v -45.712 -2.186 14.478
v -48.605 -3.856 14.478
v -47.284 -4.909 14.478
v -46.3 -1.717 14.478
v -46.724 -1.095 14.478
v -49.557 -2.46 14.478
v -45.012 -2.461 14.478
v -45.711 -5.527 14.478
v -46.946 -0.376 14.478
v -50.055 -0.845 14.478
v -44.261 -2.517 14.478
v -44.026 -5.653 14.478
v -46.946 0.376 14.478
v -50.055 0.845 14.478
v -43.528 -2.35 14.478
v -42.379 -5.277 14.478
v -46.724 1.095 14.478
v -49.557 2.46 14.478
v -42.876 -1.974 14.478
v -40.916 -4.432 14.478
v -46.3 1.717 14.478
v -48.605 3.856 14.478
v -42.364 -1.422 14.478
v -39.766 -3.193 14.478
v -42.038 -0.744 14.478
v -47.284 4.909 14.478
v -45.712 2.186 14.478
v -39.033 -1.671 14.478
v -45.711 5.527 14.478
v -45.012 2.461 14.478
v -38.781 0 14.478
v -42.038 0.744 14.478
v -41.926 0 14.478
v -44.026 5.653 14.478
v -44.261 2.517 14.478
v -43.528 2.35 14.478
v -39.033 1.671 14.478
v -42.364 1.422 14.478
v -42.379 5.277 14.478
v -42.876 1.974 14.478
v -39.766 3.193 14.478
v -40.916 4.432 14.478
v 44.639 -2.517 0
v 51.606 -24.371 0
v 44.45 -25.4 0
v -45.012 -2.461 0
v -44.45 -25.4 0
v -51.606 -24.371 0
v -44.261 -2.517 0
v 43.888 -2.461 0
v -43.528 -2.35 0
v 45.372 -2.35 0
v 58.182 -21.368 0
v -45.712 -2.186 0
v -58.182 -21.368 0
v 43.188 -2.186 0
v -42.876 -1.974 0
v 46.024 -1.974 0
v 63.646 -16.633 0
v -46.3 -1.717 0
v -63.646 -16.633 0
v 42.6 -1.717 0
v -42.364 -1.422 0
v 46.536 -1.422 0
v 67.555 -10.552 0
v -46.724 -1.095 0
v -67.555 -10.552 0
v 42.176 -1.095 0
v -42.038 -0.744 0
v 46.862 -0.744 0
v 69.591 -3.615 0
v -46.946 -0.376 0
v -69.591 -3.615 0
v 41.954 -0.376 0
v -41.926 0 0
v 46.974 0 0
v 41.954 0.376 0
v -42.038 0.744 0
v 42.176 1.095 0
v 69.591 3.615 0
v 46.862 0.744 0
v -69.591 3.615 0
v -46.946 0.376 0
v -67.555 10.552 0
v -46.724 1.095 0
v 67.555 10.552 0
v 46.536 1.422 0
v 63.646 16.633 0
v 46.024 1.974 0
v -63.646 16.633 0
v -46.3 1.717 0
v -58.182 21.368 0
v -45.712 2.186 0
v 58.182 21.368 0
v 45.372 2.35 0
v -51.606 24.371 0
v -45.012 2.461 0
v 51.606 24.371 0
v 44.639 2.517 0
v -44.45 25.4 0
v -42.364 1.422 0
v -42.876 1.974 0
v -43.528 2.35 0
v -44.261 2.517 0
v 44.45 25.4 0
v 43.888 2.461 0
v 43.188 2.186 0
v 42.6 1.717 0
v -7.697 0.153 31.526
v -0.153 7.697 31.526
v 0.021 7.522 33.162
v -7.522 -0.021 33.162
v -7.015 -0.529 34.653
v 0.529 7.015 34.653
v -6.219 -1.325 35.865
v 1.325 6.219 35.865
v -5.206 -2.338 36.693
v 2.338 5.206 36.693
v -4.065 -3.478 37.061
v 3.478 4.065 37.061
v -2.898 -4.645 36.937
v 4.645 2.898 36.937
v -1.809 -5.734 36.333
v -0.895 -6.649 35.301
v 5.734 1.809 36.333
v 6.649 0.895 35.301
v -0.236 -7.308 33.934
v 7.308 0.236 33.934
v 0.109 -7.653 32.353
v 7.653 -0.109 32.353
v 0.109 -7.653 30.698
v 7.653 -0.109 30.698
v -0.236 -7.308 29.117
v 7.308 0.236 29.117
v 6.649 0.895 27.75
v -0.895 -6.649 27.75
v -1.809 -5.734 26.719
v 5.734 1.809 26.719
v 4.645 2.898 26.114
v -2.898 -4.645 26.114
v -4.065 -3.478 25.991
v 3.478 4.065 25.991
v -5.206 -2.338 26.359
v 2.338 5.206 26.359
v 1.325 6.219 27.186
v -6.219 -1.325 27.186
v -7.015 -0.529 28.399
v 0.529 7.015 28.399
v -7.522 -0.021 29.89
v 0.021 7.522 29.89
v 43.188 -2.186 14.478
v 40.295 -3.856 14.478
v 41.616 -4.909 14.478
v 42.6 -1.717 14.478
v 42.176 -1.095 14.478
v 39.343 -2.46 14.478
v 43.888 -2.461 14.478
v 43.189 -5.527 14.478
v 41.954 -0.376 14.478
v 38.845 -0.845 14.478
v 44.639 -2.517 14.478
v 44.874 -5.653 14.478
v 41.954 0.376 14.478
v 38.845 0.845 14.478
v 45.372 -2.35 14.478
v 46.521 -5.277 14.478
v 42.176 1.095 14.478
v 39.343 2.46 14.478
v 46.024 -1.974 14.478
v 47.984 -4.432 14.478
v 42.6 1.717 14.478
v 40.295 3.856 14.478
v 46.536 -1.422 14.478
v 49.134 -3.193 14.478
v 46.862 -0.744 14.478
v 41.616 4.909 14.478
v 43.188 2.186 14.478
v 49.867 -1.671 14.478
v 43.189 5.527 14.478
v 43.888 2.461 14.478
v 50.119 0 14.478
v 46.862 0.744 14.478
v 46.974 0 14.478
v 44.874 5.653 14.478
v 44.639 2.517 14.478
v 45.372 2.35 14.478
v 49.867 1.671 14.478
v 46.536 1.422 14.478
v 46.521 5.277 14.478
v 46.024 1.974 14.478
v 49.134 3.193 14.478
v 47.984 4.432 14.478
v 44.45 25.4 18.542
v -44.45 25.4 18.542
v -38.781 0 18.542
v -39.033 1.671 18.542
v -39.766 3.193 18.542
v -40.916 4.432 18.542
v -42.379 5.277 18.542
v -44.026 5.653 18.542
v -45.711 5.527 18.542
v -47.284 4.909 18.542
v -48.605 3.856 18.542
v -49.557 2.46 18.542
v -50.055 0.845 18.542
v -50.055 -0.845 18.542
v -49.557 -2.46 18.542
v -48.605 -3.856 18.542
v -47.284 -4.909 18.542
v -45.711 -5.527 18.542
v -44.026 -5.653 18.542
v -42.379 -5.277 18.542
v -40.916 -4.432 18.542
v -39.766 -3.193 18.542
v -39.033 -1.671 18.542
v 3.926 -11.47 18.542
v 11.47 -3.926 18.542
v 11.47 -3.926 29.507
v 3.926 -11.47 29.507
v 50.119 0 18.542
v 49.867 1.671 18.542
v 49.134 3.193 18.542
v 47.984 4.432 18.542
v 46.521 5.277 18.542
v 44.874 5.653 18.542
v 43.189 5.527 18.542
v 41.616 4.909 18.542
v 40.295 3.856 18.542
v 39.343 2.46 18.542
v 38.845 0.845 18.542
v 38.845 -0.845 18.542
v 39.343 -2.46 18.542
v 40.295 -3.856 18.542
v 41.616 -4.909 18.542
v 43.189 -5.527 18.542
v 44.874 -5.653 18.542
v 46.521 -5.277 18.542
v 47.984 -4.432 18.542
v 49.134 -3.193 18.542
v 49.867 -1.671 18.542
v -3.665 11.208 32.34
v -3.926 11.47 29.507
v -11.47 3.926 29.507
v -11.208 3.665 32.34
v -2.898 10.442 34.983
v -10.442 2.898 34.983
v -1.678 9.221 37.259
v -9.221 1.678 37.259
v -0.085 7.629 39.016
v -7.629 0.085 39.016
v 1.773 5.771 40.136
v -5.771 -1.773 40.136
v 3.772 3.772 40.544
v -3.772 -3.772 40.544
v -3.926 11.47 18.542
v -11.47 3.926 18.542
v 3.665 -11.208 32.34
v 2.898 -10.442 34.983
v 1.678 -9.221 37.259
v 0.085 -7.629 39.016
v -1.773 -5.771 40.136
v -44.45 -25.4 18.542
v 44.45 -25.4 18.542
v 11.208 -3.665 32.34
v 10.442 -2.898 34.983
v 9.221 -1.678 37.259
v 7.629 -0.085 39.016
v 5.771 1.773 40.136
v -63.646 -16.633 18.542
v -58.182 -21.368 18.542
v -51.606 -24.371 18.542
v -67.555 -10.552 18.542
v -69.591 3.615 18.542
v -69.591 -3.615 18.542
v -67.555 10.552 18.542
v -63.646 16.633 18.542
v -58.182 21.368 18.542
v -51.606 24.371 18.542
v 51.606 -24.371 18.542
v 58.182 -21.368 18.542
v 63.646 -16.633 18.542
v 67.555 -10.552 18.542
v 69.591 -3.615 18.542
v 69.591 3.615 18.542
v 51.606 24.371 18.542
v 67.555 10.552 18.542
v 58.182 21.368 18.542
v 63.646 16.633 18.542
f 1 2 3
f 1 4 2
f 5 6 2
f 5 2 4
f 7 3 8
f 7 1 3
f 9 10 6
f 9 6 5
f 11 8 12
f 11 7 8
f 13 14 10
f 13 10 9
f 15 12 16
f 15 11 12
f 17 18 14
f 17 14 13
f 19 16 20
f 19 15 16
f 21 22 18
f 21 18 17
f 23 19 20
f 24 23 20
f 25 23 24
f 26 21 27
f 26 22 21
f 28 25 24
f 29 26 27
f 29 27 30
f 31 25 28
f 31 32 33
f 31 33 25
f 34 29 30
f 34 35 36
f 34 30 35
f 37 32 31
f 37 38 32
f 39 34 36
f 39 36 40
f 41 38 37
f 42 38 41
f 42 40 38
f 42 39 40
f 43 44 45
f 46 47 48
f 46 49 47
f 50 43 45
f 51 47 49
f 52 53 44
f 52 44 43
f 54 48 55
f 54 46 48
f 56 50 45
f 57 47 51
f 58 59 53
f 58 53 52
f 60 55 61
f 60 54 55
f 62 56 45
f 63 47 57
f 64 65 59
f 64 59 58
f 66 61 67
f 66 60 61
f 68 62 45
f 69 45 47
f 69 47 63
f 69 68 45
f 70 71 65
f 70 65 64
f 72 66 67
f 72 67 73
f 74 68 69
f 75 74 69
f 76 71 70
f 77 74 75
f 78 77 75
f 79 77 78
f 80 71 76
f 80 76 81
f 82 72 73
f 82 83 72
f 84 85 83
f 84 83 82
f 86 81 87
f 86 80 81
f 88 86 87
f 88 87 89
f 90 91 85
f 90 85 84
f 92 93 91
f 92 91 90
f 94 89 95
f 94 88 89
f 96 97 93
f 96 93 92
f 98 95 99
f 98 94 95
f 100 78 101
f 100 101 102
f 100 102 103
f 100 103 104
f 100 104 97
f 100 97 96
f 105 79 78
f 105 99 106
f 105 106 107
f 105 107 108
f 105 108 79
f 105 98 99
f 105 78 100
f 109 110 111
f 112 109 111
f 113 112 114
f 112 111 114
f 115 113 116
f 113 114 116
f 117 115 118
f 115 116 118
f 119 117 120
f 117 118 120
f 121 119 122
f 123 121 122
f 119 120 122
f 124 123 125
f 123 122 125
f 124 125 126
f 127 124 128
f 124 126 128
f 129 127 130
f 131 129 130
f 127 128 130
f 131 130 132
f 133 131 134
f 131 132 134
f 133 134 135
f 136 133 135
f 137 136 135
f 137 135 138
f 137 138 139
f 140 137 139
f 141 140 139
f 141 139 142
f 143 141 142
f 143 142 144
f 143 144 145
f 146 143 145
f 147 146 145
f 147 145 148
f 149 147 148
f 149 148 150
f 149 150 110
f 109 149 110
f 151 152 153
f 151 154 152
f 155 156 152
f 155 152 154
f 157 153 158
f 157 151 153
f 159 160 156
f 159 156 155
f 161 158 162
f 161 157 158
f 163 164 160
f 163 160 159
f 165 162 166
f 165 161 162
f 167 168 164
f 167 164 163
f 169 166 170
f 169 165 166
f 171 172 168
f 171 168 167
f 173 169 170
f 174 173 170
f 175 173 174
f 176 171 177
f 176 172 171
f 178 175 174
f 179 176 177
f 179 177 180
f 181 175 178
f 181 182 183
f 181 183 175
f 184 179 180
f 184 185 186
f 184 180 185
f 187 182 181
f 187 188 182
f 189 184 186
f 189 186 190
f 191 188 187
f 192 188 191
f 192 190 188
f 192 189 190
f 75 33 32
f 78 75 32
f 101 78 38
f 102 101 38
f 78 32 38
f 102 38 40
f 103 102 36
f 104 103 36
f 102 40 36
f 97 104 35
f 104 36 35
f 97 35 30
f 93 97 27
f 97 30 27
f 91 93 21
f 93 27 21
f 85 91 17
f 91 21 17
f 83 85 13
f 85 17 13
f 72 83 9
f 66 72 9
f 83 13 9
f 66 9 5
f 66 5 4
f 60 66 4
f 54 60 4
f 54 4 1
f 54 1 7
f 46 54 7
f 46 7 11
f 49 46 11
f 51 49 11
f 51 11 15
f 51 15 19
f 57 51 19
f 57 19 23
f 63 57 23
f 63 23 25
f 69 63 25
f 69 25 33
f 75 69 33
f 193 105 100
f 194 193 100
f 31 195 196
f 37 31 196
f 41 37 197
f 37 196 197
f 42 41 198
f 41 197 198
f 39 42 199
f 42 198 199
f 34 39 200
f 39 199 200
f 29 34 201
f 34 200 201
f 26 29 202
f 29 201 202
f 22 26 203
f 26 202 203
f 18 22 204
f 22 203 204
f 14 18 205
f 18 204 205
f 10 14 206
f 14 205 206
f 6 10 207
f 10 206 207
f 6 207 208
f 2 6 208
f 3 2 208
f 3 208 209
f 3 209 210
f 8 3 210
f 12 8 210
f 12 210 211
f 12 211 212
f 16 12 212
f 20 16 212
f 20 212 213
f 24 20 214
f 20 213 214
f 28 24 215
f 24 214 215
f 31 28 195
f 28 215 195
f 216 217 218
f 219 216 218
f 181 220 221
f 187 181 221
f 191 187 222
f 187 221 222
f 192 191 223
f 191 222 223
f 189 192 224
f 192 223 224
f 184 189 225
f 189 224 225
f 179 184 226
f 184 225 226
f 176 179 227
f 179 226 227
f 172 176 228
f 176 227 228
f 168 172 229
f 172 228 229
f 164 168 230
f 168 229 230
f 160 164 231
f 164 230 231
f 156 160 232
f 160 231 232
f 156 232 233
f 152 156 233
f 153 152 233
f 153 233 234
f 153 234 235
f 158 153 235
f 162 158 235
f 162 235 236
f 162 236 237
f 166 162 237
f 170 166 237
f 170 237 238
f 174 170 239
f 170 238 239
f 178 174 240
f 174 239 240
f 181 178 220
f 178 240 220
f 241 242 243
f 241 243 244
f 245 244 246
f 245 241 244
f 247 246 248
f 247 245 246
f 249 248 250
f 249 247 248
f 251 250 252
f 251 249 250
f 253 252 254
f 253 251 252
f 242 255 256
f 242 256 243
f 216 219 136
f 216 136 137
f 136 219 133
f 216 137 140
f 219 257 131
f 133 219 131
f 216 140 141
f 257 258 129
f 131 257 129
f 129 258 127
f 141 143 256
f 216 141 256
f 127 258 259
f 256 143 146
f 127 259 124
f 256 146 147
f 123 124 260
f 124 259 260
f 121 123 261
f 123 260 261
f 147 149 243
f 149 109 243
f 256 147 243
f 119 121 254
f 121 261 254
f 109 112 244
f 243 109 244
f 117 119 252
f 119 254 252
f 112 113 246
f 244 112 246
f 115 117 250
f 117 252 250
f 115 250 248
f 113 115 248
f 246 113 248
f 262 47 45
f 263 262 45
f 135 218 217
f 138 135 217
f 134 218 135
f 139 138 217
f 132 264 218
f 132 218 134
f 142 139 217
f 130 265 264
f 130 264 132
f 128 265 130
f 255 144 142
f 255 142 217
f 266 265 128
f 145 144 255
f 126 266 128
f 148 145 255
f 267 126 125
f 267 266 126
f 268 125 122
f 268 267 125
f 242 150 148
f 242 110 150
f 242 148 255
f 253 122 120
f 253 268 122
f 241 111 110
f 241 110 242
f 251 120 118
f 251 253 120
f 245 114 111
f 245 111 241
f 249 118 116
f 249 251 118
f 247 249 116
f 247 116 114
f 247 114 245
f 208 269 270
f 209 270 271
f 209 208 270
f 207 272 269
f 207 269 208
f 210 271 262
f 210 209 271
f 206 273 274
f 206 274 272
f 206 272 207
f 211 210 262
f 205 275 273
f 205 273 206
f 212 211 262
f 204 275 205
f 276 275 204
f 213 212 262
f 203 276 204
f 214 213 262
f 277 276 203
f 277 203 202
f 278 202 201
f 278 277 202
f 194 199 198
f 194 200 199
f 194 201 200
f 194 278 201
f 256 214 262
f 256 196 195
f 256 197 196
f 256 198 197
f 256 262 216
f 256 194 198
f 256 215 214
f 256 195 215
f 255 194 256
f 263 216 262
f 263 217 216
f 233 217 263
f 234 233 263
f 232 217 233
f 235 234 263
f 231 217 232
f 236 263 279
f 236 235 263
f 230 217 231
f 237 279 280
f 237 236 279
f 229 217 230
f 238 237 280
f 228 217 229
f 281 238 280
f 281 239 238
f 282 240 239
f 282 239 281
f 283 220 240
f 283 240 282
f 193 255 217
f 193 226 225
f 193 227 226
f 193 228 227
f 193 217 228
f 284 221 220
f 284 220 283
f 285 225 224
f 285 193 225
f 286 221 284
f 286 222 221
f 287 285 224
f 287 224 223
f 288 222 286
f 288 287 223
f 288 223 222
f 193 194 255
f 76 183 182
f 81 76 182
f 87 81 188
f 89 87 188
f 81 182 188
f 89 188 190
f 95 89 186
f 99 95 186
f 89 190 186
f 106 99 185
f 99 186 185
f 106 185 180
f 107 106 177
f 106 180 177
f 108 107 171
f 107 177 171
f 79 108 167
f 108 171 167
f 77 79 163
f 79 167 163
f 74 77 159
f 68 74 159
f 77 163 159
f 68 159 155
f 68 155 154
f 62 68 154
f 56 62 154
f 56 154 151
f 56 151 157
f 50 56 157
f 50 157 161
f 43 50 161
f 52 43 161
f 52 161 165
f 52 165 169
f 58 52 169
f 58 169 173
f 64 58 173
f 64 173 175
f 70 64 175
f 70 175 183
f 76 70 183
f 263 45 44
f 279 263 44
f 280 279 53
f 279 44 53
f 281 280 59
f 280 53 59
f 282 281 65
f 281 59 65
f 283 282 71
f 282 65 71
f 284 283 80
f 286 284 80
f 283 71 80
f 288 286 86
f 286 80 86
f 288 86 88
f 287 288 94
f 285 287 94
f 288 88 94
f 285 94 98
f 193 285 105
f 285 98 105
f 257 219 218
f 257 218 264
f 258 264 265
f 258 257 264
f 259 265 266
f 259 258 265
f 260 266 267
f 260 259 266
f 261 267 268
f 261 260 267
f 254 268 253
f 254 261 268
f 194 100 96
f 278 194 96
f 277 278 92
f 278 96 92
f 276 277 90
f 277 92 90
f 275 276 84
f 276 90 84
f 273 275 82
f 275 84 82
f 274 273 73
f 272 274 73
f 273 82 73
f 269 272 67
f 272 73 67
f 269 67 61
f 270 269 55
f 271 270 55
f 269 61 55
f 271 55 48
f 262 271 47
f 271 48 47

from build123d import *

# Parameters (mm, degrees)
F1_DEPTH     = 18.542
F2_R         = 5.6687062333
F3_DEPTH     = 4.064
F4_R         = 2.5242395044
F5_DEPTH     = 18.543
F8_W         = 21.7736046761
F8_H         = 40.5452698469
F9_DEPTH     = 5.334
F10_T1_DEPTH = 65.8569220358
F10_T3_DEPTH = 65.8569220358
F11_R        = 5.5506303957
F12_DEPTH    = 72.686920908


# Not quite as in the source:
# - a fillet or chamfer that OpenCascade refuses, or shapes differently, is made with other operations: its cross-section is extruded or revolved along the edge and cut away or added


with BuildPart() as f1:
    # F0 (on Top) → F1 (new body)
    with BuildSketch(Plane.XY):
        with BuildLine():
            Line((44.45, 25.4), (-44.45, 25.4))
            ThreePointArc((-44.45, 25.4), (-69.85, 0), (-44.45, -25.4))
            Line((-44.45, -25.4), (44.45, -25.4))
            ThreePointArc((44.45, -25.4), (69.85, 0), (44.45, 25.4))
        make_face()
    extrude(amount=F1_DEPTH)

    # F2 (on face) → F3 (cut)
    with BuildSketch(Plane.XY.offset(18.542)):
        with Locations((-44.45, 0)):
            Circle(F2_R)
        with Locations((44.45, 0)):
            Circle(F2_R)
    extrude(amount=-F3_DEPTH, mode=Mode.SUBTRACT)

    # F4 (on face) → F5 (cut, through all)
    with BuildSketch(Plane.XY.offset(18.542)):
        with Locations((-44.45, 0)):
            Circle(F4_R)
        with Locations((44.45, 0)):
            Circle(F4_R)
    extrude(amount=-F5_DEPTH, mode=Mode.SUBTRACT)

    # F8 (on line) → F9 (join, symmetric)
    with BuildSketch(Plane(origin=(0, 0, 0), x_dir=(-0.7071067812, 0.7071067812, 0), z_dir=(0.7071067812, 0.7071067812, 0))):
        with Locations((0, 20.2726349235)):
            Rectangle(F8_W, F8_H)
    extrude(amount=F9_DEPTH, both=True)

    # F10: fillet of radius 11.0377844072 on 2 edges, made by hand

    # F10_s2 → F10_t1 (cut)
    with BuildSketch(Plane(origin=(-23.2839380798, -23.2839380798, 0), x_dir=(0, 0, 1), z_dir=(0.7071067812, 0.7071067812, 0))):
        with BuildLine():
            ThreePointArc((29.5074854397, 10.8868023381), (37.3123776433, 7.6539101345), (40.5452698469, -0.1509820691))
            Line((40.5452698469, -0.1509820691), (40.5452698469, 10.8868023381))
            Line((40.5452698469, 10.8868023381), (29.5074854397, 10.8868023381))
        make_face()
    extrude(amount=F10_T1_DEPTH, mode=Mode.SUBTRACT)

    # F10_s4 → F10_t3 (cut)
    with BuildSketch(Plane(origin=(23.2839380798, 23.2839380798, 0), x_dir=(0, 0, 1), z_dir=(-0.7071067812, -0.7071067812, 0))):
        with BuildLine():
            ThreePointArc((29.5074854397, 10.8868023381), (37.3123776433, 7.6539101345), (40.5452698469, -0.1509820691))
            Line((40.5452698469, -0.1509820691), (40.5452698469, 10.8868023381))
            Line((40.5452698469, 10.8868023381), (29.5074854397, 10.8868023381))
        make_face()
    extrude(amount=F10_T3_DEPTH, mode=Mode.SUBTRACT)

    # F11 (on face) → F12 (cut, through all)
    with BuildSketch(Plane(origin=(3.7717075708, 3.7717075708, 0), x_dir=(-0.7071067812, 0.7071067812, 0), z_dir=(0.7071067812, 0.7071067812, 0))):
        with Locations((0, 31.5257720649)):
            Circle(F11_R)
    extrude(amount=-F12_DEPTH, mode=Mode.SUBTRACT)


solid = f1.part
